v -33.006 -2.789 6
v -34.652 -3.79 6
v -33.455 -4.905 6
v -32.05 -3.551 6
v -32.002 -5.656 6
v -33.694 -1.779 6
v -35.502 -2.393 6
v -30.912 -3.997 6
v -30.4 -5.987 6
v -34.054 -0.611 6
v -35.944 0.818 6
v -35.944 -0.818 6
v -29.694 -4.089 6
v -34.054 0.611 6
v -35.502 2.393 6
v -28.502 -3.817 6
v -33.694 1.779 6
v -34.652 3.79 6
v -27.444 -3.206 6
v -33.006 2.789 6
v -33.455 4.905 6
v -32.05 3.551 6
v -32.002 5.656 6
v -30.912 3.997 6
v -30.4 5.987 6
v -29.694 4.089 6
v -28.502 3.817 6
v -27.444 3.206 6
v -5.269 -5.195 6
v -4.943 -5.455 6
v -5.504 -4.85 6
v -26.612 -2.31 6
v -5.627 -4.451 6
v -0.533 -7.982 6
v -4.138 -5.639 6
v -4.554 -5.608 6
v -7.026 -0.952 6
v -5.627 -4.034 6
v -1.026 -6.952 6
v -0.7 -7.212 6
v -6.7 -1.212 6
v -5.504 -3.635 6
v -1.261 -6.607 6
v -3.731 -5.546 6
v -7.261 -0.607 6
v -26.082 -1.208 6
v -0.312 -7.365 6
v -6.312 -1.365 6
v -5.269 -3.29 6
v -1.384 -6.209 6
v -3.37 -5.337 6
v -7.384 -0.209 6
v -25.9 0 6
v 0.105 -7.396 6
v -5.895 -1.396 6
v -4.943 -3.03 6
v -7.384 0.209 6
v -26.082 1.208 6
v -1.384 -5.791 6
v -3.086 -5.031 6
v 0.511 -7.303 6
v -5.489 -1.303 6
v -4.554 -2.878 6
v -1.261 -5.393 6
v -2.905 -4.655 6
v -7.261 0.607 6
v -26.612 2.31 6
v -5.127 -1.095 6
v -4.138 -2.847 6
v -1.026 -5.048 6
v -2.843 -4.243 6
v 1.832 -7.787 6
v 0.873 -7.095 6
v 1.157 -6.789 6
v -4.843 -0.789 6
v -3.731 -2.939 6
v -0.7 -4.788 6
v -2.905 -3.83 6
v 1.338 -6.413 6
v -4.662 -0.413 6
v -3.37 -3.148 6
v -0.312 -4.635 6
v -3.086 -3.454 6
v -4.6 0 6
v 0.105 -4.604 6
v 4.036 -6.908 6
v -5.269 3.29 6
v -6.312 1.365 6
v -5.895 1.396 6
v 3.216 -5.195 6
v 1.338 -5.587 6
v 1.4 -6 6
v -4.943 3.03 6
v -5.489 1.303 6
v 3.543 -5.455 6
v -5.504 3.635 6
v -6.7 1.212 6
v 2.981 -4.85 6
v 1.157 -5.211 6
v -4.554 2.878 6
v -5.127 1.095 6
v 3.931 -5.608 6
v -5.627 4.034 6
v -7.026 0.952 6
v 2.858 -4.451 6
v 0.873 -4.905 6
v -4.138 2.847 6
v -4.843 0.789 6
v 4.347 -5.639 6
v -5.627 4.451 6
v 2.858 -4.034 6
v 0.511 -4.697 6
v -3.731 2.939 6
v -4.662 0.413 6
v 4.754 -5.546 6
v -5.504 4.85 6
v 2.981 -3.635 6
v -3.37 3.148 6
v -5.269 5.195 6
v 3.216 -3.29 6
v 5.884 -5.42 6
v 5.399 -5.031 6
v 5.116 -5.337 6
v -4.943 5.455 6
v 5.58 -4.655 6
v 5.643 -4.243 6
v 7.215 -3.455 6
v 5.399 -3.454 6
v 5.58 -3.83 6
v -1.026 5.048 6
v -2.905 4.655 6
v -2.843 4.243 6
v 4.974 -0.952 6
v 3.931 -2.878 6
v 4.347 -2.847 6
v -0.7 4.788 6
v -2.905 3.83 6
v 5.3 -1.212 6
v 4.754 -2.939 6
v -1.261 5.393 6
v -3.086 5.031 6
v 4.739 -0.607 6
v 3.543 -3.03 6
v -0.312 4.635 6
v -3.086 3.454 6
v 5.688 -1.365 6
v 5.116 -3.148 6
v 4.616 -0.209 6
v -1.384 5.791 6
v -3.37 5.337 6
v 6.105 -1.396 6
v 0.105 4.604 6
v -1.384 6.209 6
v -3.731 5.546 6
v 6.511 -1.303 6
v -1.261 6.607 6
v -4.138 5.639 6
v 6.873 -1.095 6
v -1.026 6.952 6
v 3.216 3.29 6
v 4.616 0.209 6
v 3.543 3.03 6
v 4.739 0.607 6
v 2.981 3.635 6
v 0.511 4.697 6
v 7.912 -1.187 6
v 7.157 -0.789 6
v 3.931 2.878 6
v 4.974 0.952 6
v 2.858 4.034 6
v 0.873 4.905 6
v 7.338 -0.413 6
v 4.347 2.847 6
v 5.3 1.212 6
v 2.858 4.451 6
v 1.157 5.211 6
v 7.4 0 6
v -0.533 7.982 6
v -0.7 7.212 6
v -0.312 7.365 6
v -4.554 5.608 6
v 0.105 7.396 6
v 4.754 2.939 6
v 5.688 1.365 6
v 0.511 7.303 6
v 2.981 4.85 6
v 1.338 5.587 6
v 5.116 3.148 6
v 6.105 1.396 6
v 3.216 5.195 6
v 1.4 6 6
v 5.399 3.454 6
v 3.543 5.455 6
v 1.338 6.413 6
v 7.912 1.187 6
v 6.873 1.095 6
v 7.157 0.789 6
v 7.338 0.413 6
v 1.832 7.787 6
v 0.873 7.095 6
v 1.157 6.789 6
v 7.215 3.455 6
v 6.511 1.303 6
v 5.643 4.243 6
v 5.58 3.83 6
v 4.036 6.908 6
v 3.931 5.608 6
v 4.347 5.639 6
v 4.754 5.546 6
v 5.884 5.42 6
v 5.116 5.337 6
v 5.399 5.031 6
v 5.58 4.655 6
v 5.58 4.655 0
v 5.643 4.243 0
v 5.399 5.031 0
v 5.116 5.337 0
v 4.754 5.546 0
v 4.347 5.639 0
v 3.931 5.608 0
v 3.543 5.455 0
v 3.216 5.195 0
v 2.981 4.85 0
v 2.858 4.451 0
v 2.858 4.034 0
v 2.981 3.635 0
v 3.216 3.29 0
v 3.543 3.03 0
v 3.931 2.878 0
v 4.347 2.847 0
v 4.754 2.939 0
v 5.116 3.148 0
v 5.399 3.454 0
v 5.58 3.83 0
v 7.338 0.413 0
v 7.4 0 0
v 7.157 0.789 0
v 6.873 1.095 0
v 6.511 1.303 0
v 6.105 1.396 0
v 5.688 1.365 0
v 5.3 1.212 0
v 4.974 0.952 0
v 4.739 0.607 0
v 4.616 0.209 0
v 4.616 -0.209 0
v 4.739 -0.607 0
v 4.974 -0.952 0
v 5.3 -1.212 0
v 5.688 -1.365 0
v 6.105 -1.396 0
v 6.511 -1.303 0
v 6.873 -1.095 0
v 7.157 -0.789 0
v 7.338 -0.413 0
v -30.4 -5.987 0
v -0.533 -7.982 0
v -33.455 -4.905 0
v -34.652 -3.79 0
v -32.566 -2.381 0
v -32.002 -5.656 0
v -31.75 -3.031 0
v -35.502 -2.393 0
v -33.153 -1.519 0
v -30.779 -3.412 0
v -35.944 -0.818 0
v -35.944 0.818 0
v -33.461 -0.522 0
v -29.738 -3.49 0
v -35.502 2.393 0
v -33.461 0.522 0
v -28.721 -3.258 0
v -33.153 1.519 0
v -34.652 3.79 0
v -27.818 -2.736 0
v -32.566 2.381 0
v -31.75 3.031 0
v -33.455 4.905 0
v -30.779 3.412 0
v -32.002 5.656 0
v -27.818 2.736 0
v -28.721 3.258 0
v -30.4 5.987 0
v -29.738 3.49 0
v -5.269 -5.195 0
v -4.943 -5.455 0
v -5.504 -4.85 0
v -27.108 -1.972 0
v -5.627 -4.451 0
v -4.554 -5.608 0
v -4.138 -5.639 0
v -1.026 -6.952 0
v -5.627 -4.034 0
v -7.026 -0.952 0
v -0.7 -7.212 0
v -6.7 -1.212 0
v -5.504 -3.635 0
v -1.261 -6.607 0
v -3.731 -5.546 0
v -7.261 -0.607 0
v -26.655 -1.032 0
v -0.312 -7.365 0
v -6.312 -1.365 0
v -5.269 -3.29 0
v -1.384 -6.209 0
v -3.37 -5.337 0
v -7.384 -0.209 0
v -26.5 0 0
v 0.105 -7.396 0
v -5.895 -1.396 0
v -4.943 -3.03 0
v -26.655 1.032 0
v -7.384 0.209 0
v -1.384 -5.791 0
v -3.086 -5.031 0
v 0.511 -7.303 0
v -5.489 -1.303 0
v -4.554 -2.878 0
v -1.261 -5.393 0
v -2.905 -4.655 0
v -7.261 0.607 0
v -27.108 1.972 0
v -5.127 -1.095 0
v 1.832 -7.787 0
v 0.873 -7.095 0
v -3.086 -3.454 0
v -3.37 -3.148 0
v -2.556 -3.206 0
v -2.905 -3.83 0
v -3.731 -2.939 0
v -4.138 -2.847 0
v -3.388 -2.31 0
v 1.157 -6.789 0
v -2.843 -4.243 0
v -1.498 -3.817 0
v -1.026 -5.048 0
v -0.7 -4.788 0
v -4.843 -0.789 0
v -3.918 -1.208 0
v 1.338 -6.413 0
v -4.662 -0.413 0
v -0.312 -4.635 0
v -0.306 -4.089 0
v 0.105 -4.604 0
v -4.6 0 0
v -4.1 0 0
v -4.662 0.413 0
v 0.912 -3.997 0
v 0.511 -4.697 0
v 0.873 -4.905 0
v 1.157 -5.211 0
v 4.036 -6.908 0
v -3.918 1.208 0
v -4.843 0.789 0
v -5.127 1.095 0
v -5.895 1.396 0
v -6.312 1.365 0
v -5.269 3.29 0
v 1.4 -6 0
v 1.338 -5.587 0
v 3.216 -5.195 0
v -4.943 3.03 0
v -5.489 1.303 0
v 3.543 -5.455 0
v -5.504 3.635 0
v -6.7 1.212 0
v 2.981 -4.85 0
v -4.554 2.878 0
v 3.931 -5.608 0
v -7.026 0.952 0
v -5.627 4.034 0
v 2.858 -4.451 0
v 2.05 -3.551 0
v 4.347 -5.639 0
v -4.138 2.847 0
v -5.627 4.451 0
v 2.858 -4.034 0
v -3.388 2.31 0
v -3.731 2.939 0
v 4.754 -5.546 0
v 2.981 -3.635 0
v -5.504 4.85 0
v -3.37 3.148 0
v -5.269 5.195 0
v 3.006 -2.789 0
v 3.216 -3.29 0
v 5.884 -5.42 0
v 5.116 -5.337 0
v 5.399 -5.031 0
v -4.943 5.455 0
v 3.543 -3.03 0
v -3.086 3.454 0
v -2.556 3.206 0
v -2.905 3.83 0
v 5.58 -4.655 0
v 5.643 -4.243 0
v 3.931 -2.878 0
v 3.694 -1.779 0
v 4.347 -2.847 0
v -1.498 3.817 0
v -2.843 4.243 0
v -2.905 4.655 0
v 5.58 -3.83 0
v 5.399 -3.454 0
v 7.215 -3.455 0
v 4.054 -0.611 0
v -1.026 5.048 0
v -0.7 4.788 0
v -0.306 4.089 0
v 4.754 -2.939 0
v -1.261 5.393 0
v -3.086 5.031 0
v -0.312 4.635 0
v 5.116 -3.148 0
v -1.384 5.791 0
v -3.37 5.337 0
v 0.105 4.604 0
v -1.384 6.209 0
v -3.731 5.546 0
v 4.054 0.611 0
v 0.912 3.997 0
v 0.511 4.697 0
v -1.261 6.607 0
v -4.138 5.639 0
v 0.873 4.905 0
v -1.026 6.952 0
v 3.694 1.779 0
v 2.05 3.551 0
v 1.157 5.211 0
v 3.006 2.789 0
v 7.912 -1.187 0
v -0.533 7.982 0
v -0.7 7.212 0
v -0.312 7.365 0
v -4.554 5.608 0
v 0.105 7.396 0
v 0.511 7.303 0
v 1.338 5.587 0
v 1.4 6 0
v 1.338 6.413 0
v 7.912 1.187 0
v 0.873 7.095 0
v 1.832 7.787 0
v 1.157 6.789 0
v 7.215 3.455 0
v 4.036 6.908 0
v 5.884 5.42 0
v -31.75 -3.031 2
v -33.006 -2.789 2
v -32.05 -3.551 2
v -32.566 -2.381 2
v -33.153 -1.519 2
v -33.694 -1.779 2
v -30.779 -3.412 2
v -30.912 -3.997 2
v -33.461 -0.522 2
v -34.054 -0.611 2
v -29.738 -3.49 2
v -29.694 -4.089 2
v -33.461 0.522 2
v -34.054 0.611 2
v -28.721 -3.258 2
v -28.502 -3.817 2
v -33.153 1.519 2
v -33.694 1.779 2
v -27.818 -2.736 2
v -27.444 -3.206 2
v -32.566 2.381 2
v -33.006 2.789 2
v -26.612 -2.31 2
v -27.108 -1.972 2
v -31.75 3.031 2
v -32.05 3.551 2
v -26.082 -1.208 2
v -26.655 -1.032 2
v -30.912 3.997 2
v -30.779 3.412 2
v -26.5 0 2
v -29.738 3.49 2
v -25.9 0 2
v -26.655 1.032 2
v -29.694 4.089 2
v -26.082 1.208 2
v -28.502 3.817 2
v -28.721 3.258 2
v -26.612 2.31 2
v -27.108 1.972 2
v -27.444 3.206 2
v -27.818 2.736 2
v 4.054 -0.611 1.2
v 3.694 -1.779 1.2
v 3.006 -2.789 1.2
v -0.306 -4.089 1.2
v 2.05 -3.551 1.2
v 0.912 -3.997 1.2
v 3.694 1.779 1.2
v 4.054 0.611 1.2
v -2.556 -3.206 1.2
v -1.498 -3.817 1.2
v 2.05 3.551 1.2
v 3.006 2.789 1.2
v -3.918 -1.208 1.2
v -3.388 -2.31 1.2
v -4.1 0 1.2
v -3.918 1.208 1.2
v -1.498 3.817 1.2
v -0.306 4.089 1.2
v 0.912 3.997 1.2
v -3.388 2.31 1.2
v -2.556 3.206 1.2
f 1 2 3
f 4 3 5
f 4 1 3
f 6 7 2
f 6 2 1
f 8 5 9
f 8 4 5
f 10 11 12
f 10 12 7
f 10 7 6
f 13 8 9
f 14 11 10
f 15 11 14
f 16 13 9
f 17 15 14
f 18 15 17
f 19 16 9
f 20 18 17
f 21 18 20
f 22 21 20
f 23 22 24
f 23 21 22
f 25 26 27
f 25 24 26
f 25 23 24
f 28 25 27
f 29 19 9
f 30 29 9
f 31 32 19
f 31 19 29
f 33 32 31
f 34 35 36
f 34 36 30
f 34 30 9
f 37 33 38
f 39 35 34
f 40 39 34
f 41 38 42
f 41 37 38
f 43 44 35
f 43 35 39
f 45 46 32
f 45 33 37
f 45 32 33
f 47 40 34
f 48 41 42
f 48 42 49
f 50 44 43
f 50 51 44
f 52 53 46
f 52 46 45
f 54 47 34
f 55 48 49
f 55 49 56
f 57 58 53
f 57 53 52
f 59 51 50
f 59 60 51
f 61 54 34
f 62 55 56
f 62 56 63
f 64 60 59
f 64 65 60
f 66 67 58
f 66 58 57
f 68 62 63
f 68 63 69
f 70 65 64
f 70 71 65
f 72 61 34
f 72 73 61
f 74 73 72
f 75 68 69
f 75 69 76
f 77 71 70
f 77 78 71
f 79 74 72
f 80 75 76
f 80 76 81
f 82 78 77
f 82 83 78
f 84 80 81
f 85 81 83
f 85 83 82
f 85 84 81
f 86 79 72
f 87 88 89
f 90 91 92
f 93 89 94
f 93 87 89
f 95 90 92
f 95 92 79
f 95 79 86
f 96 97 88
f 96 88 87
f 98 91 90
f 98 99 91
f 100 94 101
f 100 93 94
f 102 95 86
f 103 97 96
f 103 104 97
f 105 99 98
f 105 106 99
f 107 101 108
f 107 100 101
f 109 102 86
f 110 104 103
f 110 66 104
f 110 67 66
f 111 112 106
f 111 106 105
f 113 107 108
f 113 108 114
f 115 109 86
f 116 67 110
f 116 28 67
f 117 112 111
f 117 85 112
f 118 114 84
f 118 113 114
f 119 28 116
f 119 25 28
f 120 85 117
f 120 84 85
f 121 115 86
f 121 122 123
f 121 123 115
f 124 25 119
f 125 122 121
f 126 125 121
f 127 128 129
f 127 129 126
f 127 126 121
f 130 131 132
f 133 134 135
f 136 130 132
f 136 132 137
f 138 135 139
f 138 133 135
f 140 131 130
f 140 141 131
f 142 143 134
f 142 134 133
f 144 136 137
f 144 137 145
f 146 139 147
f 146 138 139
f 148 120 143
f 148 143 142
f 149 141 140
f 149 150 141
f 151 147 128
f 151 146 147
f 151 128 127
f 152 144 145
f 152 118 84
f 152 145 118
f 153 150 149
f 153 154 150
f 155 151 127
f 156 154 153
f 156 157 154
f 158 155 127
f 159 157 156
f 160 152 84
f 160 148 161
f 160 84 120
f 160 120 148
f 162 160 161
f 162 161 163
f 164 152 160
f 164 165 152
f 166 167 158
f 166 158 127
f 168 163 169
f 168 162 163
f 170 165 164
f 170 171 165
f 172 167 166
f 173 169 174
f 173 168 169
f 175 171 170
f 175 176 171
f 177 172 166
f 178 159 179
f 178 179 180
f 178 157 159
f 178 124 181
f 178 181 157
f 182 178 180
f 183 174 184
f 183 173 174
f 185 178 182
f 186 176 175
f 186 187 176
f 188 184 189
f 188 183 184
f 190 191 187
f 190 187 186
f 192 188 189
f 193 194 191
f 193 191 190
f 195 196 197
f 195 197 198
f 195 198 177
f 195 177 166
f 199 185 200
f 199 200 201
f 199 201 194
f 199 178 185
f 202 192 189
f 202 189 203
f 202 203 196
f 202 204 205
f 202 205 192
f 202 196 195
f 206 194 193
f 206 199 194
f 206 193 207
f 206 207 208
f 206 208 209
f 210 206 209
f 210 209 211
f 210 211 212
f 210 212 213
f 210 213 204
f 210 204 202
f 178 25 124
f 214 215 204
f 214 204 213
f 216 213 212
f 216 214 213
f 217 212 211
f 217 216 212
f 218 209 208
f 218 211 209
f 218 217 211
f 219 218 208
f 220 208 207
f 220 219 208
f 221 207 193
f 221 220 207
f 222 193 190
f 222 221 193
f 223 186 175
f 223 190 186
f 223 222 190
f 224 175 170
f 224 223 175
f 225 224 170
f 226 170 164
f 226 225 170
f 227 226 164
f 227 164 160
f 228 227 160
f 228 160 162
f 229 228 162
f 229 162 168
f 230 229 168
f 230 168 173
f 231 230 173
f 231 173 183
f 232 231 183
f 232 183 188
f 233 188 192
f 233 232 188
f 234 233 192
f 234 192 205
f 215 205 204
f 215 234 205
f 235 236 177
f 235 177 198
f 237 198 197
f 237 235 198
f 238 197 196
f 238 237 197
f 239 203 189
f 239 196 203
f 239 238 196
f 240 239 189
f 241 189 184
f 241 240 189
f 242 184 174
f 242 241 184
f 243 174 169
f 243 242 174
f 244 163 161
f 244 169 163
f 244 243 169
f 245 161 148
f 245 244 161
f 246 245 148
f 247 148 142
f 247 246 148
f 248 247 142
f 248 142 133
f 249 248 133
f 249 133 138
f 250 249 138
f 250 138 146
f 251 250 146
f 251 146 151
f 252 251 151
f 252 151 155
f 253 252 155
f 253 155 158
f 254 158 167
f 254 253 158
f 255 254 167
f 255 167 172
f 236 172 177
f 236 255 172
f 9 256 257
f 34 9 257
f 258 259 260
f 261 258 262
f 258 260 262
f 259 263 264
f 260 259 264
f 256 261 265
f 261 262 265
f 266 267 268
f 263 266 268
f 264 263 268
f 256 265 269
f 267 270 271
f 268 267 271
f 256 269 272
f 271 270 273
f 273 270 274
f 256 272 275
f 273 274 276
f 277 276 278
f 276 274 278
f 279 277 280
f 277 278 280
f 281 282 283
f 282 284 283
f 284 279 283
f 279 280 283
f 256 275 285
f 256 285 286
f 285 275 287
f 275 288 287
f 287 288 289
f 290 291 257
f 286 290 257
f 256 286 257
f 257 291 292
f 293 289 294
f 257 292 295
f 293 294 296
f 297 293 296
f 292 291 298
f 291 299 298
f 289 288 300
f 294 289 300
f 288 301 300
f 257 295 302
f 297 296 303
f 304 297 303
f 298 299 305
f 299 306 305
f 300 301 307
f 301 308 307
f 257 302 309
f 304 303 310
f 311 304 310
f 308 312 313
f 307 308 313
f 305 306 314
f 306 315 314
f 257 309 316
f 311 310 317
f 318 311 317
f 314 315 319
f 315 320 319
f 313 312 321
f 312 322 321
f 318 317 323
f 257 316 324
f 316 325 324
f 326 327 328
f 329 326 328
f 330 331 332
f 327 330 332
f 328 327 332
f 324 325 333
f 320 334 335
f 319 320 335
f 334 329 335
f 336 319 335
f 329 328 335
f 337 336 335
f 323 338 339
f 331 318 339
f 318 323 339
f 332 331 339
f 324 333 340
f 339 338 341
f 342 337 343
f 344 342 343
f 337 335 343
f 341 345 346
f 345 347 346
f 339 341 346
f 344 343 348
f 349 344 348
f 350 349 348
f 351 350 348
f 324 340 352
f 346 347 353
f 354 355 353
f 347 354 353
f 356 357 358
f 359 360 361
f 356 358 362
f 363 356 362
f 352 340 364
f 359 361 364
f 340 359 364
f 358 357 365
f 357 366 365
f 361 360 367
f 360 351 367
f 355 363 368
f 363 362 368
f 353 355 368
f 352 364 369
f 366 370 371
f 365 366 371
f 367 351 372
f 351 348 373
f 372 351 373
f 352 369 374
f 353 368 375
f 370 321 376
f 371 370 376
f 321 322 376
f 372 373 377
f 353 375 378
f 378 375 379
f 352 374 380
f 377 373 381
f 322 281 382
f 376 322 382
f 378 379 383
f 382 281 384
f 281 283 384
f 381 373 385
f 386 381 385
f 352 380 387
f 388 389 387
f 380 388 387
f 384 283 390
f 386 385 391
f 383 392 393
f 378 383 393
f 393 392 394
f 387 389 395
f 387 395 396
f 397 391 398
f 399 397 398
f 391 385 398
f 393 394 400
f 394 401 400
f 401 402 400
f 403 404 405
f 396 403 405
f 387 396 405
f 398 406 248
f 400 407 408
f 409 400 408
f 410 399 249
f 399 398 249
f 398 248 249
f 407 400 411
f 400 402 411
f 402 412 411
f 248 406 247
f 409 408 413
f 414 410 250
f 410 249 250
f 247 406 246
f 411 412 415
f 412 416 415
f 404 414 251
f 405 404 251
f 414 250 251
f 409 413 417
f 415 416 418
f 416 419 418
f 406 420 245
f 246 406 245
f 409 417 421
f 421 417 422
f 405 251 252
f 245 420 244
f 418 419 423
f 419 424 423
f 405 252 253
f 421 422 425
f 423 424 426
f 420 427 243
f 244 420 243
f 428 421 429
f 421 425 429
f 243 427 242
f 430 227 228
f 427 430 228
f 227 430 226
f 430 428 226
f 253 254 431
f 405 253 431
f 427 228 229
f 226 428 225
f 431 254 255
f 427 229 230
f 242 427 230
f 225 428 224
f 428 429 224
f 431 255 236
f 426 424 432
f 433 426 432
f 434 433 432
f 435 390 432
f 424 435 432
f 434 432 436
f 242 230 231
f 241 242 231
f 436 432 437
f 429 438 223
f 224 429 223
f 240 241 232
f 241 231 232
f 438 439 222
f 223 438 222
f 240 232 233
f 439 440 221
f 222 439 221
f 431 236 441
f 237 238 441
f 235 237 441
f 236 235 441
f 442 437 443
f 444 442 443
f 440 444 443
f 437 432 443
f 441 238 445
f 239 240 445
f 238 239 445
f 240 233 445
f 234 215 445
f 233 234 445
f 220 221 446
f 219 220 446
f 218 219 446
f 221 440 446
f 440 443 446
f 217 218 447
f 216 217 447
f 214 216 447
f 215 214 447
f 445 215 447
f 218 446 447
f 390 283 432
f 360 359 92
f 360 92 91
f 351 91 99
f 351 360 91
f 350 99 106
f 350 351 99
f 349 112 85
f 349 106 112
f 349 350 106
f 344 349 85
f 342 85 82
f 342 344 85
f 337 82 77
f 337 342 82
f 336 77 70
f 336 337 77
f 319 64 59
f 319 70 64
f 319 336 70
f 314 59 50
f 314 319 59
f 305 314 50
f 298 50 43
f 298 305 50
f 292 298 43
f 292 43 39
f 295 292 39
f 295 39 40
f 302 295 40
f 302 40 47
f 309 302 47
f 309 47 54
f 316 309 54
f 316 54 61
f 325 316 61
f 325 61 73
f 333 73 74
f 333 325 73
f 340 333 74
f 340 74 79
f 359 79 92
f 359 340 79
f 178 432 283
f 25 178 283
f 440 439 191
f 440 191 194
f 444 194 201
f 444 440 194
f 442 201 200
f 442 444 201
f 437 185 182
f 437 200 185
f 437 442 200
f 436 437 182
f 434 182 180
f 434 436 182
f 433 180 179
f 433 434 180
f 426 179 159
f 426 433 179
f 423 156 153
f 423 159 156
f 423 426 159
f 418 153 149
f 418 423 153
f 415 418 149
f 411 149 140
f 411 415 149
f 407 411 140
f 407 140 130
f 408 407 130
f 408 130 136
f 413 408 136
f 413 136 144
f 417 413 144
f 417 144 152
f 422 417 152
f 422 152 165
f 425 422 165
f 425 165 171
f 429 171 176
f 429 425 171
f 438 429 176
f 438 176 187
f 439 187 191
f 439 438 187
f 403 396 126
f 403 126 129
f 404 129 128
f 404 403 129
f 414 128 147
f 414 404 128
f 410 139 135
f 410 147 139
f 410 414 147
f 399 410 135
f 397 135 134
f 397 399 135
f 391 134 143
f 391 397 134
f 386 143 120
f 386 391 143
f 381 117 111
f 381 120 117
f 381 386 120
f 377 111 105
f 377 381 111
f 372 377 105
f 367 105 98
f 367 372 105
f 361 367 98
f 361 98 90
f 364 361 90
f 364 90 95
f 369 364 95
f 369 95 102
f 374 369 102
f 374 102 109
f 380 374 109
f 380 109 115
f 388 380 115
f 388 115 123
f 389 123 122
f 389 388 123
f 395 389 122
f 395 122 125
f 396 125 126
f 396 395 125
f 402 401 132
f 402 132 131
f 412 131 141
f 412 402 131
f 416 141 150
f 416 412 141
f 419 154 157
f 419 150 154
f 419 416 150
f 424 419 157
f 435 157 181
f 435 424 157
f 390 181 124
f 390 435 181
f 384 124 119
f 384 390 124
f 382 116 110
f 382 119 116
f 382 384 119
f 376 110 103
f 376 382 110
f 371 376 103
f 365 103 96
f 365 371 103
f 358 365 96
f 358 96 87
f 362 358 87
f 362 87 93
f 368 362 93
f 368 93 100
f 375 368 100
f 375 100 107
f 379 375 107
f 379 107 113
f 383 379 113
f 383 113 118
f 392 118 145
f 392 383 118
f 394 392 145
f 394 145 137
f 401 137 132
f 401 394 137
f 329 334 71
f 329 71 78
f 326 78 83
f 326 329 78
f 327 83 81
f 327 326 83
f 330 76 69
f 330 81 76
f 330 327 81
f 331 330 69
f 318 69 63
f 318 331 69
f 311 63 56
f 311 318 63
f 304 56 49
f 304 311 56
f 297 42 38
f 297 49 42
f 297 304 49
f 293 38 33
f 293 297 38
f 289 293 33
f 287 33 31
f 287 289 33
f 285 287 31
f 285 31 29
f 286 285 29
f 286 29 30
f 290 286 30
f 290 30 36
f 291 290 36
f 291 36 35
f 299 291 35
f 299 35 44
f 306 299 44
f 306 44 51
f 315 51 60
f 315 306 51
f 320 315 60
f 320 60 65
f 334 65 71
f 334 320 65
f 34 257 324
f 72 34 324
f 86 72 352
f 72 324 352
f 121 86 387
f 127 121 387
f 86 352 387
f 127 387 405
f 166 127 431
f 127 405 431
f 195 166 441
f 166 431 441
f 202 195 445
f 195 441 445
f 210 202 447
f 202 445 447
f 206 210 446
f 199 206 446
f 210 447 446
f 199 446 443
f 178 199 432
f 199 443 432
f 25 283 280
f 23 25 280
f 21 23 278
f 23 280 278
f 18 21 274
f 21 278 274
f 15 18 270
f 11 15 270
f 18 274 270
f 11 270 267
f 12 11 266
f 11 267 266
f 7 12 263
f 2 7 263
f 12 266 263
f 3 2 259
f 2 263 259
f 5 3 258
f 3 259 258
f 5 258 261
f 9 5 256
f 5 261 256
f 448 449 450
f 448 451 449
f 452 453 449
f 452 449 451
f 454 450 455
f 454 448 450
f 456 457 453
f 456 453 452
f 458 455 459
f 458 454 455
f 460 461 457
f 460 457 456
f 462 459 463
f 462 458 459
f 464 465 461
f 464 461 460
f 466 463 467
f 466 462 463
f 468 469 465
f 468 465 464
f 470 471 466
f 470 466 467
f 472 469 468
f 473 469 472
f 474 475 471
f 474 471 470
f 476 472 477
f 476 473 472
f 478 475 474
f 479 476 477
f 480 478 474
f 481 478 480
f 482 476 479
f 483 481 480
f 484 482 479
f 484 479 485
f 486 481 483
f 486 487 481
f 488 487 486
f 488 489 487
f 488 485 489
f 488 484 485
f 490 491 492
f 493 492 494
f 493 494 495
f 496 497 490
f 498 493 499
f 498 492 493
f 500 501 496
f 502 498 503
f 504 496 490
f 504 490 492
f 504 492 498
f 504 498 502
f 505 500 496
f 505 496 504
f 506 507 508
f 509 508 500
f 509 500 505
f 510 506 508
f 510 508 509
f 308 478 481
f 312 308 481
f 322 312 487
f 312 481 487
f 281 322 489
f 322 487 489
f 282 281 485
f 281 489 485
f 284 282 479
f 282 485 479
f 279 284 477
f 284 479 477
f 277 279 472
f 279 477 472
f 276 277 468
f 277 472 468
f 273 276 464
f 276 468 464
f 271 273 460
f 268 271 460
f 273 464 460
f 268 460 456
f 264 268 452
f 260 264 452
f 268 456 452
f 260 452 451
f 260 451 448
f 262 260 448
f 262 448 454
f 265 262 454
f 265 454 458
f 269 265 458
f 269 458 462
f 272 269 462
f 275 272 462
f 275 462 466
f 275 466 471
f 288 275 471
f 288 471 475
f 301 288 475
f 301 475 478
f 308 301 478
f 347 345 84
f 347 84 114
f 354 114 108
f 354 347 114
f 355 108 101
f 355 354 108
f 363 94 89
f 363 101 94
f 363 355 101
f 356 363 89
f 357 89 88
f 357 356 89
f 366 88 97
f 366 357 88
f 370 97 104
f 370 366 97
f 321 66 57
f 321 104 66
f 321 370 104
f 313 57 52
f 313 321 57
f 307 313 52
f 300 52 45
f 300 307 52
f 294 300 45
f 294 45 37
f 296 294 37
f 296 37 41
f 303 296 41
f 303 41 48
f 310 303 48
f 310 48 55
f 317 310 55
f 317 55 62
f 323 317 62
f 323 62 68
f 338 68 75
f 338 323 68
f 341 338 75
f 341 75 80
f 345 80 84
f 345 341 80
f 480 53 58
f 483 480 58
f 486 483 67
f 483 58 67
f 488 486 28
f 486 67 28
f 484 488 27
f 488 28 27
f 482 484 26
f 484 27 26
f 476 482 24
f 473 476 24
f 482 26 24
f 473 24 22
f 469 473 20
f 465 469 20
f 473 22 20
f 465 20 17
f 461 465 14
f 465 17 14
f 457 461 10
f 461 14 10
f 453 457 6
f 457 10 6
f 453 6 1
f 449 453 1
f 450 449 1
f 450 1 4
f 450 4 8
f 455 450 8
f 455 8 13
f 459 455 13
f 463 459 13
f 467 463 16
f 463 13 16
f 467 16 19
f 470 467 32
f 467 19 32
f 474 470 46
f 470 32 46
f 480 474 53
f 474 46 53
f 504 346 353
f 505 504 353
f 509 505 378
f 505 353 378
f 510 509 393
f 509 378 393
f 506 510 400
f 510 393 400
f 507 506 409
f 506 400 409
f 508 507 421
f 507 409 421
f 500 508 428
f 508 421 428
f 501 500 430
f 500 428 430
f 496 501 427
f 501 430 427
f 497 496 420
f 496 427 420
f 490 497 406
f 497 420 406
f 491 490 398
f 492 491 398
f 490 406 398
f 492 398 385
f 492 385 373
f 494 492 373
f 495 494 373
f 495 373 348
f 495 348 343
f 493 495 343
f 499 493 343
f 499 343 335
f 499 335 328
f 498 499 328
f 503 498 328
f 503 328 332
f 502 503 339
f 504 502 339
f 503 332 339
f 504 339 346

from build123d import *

# Parameters (mm, degrees)
EXTRUDE_1_DEPTH          = 6
CUT_EXTRUDE_1_DEPTH      = 38.363083385
CUT_EXTRUDE_1_DEPTH_BACK = 38.363083385
SKETCH_2_R               = 1.4
SKETCH_3_R               = 4.1
CUT_EXTRUDE_2_DEPTH      = 1.2
SKETCH_4_R               = 4.1
CUT_EXTRUDE_3_DEPTH      = 4
SKETCH_5_R               = 3.5
CUT_EXTRUDE_5_DEPTH      = 38.363083385


with BuildPart() as part:
    # ｽｹｯﾁ1 → ﾎﾞｽ - 押し出し1 (new body)
    with BuildSketch(Plane.XY):
        with BuildLine():
            Line((-0.533333333, 7.982202425), (-30.4, 5.986651819))
            ThreePointArc((-30.4, 5.986651819), (-36, 0), (-30.4, -5.986651819))
            Line((-30.4, -5.986651819), (-0.533333333, -7.982202425))
            ThreePointArc((-0.533333333, -7.982202425), (8, 0), (-0.533333333, 7.982202425))
        make_face()
    extrude(amount=EXTRUDE_1_DEPTH)

    # ｽｹｯﾁ2 → ｶｯﾄ - 押し出し1 (cut, two sides: drawn at the far end of the back side and taken through both)
    with BuildSketch(Plane.XY.offset(-CUT_EXTRUDE_1_DEPTH_BACK)):
        with Locations((-4.242640687, 4.242640687)):
            Circle(SKETCH_2_R)
        with Locations((6, 0)):
            Circle(SKETCH_2_R)
        with Locations((0, 6)):
            Circle(SKETCH_2_R)
        with Locations((-6, 0)):
            Circle(SKETCH_2_R)
        with Locations((-4.242640687, -4.242640687)):
            Circle(SKETCH_2_R)
        with Locations((0, -6)):
            Circle(SKETCH_2_R)
        with Locations((4.242640687, -4.242640687)):
            Circle(SKETCH_2_R)
        with Locations((4.242640687, 4.242640687)):
            Circle(SKETCH_2_R)
    extrude(amount=CUT_EXTRUDE_1_DEPTH + CUT_EXTRUDE_1_DEPTH_BACK, mode=Mode.SUBTRACT)

    # ｽｹｯﾁ3 → ｶｯﾄ - 押し出し2 (cut)
    with BuildSketch(Plane(origin=(0, 0, 0), x_dir=(-1, 0, 0), z_dir=(0, 0, -1))):
        Circle(SKETCH_3_R)
    extrude(amount=-CUT_EXTRUDE_2_DEPTH, mode=Mode.SUBTRACT)

    # ｽｹｯﾁ4 → ｶｯﾄ - 押し出し3 (cut)
    with BuildSketch(Plane.XY.offset(6)):
        with Locations((-30, 0)):
            Circle(SKETCH_4_R)
    extrude(amount=-CUT_EXTRUDE_3_DEPTH, mode=Mode.SUBTRACT)

    # ｽｹｯﾁ5 → ｶｯﾄ - 押し出し5 (cut, through all)
    with BuildSketch(Plane.XY.offset(6)):
        with Locations((-30, 0)):
            Circle(SKETCH_5_R)
    extrude(amount=-CUT_EXTRUDE_5_DEPTH, mode=Mode.SUBTRACT)


solid = part.part
